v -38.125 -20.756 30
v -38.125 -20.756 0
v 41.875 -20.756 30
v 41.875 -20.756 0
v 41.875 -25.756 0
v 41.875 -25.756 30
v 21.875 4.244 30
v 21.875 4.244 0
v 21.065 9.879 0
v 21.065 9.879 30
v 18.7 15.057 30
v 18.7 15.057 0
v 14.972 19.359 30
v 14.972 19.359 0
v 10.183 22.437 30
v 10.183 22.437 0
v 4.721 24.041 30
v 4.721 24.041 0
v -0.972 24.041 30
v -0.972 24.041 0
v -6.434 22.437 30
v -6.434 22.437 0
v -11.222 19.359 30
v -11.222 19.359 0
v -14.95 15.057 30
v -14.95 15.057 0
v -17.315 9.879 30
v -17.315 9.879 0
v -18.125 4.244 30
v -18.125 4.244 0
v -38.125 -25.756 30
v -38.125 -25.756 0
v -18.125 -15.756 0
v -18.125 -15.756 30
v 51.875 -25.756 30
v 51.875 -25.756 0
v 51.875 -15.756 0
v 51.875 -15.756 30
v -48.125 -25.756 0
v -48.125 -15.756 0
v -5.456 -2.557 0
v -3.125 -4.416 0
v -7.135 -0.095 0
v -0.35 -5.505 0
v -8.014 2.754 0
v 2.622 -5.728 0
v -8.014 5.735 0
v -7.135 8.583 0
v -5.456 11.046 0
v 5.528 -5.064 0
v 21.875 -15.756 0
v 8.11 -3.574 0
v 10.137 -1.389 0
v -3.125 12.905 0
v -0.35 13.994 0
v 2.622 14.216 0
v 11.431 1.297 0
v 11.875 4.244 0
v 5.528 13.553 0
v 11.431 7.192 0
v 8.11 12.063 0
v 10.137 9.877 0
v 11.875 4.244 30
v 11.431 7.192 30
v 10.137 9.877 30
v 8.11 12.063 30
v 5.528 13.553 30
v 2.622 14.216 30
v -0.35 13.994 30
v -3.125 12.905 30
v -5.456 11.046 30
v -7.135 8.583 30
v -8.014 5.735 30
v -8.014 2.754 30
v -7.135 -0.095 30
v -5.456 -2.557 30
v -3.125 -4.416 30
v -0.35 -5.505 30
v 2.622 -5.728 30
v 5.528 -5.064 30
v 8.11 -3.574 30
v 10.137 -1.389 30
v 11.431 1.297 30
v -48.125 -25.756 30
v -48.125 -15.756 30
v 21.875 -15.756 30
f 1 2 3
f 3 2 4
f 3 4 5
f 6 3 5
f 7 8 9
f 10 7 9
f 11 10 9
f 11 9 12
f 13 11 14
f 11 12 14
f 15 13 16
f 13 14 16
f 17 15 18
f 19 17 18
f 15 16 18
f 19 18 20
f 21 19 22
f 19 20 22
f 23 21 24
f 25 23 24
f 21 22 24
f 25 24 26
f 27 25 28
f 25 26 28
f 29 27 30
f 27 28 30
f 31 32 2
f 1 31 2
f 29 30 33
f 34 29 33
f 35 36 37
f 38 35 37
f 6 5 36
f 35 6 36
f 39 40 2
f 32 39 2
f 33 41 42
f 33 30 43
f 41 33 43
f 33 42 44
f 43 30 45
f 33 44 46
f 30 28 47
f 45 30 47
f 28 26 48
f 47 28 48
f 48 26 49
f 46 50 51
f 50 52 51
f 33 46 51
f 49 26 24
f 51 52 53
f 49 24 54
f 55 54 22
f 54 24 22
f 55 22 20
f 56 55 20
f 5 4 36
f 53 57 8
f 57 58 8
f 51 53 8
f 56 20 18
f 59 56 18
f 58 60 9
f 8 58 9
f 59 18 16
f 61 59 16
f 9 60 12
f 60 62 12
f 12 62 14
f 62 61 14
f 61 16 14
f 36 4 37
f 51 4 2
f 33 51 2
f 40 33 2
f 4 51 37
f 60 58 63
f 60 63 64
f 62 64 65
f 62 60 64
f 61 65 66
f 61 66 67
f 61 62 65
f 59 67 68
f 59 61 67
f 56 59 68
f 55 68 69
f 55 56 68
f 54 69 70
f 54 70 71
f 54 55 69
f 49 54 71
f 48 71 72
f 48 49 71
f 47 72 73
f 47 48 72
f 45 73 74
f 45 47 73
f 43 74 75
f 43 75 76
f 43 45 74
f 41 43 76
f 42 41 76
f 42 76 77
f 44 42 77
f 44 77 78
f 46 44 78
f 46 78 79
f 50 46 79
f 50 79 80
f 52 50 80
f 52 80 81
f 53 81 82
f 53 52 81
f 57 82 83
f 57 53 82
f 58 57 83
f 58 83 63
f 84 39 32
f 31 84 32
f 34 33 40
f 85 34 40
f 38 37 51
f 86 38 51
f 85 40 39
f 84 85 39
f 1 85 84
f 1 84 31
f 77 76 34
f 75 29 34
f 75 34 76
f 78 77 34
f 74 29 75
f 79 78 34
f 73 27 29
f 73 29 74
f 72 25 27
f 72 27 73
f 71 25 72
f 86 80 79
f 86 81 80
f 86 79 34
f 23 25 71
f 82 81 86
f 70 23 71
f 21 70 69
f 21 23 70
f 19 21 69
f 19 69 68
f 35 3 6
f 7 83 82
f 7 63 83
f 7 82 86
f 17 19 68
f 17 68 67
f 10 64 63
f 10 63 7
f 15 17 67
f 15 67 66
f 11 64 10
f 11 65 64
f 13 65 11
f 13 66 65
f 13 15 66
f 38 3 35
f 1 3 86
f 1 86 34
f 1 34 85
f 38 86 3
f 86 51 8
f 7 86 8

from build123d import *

# Parameters (mm, degrees)
SKETCH1_R           = 10
BOSS_EXTRUDE1_DEPTH = 30


with BuildPart() as part:
    # Sketch1 → Boss-Extrude1 (new body)
    with BuildSketch(Plane.XY):
        with BuildLine():
            Line((-38.125206472, -20.755714087), (41.874793528, -20.755714087))
            Line((41.874793528, -20.755714087), (41.874793528, -25.755714087))
            Line((41.874793528, -25.755714087), (51.874793528, -25.755714087))
            Line((51.874793528, -25.755714087), (51.874793528, -15.755714087))
            Line((51.874793528, -15.755714087), (21.874793528, -15.755714087))
            Line((21.874793528, -15.755714087), (21.874793528, 4.244285913))
            ThreePointArc((21.874793528, 4.244285913), (1.874793528, 24.244285913), (-18.125206472, 4.244285913))
            Line((-18.125206472, 4.244285913), (-18.125206472, -15.755714087))
            Line((-18.125206472, -15.755714087), (-48.125206472, -15.755714087))
            Line((-48.125206472, -15.755714087), (-48.125206472, -25.755714087))
            Line((-48.125206472, -25.755714087), (-38.125206472, -25.755714087))
            Line((-38.125206472, -25.755714087), (-38.125206472, -20.755714087))
        make_face()
        with Locations((1.874793528, 4.244285913)):
            Circle(SKETCH1_R, mode=Mode.SUBTRACT)
    extrude(amount=BOSS_EXTRUDE1_DEPTH)


solid = part.part
